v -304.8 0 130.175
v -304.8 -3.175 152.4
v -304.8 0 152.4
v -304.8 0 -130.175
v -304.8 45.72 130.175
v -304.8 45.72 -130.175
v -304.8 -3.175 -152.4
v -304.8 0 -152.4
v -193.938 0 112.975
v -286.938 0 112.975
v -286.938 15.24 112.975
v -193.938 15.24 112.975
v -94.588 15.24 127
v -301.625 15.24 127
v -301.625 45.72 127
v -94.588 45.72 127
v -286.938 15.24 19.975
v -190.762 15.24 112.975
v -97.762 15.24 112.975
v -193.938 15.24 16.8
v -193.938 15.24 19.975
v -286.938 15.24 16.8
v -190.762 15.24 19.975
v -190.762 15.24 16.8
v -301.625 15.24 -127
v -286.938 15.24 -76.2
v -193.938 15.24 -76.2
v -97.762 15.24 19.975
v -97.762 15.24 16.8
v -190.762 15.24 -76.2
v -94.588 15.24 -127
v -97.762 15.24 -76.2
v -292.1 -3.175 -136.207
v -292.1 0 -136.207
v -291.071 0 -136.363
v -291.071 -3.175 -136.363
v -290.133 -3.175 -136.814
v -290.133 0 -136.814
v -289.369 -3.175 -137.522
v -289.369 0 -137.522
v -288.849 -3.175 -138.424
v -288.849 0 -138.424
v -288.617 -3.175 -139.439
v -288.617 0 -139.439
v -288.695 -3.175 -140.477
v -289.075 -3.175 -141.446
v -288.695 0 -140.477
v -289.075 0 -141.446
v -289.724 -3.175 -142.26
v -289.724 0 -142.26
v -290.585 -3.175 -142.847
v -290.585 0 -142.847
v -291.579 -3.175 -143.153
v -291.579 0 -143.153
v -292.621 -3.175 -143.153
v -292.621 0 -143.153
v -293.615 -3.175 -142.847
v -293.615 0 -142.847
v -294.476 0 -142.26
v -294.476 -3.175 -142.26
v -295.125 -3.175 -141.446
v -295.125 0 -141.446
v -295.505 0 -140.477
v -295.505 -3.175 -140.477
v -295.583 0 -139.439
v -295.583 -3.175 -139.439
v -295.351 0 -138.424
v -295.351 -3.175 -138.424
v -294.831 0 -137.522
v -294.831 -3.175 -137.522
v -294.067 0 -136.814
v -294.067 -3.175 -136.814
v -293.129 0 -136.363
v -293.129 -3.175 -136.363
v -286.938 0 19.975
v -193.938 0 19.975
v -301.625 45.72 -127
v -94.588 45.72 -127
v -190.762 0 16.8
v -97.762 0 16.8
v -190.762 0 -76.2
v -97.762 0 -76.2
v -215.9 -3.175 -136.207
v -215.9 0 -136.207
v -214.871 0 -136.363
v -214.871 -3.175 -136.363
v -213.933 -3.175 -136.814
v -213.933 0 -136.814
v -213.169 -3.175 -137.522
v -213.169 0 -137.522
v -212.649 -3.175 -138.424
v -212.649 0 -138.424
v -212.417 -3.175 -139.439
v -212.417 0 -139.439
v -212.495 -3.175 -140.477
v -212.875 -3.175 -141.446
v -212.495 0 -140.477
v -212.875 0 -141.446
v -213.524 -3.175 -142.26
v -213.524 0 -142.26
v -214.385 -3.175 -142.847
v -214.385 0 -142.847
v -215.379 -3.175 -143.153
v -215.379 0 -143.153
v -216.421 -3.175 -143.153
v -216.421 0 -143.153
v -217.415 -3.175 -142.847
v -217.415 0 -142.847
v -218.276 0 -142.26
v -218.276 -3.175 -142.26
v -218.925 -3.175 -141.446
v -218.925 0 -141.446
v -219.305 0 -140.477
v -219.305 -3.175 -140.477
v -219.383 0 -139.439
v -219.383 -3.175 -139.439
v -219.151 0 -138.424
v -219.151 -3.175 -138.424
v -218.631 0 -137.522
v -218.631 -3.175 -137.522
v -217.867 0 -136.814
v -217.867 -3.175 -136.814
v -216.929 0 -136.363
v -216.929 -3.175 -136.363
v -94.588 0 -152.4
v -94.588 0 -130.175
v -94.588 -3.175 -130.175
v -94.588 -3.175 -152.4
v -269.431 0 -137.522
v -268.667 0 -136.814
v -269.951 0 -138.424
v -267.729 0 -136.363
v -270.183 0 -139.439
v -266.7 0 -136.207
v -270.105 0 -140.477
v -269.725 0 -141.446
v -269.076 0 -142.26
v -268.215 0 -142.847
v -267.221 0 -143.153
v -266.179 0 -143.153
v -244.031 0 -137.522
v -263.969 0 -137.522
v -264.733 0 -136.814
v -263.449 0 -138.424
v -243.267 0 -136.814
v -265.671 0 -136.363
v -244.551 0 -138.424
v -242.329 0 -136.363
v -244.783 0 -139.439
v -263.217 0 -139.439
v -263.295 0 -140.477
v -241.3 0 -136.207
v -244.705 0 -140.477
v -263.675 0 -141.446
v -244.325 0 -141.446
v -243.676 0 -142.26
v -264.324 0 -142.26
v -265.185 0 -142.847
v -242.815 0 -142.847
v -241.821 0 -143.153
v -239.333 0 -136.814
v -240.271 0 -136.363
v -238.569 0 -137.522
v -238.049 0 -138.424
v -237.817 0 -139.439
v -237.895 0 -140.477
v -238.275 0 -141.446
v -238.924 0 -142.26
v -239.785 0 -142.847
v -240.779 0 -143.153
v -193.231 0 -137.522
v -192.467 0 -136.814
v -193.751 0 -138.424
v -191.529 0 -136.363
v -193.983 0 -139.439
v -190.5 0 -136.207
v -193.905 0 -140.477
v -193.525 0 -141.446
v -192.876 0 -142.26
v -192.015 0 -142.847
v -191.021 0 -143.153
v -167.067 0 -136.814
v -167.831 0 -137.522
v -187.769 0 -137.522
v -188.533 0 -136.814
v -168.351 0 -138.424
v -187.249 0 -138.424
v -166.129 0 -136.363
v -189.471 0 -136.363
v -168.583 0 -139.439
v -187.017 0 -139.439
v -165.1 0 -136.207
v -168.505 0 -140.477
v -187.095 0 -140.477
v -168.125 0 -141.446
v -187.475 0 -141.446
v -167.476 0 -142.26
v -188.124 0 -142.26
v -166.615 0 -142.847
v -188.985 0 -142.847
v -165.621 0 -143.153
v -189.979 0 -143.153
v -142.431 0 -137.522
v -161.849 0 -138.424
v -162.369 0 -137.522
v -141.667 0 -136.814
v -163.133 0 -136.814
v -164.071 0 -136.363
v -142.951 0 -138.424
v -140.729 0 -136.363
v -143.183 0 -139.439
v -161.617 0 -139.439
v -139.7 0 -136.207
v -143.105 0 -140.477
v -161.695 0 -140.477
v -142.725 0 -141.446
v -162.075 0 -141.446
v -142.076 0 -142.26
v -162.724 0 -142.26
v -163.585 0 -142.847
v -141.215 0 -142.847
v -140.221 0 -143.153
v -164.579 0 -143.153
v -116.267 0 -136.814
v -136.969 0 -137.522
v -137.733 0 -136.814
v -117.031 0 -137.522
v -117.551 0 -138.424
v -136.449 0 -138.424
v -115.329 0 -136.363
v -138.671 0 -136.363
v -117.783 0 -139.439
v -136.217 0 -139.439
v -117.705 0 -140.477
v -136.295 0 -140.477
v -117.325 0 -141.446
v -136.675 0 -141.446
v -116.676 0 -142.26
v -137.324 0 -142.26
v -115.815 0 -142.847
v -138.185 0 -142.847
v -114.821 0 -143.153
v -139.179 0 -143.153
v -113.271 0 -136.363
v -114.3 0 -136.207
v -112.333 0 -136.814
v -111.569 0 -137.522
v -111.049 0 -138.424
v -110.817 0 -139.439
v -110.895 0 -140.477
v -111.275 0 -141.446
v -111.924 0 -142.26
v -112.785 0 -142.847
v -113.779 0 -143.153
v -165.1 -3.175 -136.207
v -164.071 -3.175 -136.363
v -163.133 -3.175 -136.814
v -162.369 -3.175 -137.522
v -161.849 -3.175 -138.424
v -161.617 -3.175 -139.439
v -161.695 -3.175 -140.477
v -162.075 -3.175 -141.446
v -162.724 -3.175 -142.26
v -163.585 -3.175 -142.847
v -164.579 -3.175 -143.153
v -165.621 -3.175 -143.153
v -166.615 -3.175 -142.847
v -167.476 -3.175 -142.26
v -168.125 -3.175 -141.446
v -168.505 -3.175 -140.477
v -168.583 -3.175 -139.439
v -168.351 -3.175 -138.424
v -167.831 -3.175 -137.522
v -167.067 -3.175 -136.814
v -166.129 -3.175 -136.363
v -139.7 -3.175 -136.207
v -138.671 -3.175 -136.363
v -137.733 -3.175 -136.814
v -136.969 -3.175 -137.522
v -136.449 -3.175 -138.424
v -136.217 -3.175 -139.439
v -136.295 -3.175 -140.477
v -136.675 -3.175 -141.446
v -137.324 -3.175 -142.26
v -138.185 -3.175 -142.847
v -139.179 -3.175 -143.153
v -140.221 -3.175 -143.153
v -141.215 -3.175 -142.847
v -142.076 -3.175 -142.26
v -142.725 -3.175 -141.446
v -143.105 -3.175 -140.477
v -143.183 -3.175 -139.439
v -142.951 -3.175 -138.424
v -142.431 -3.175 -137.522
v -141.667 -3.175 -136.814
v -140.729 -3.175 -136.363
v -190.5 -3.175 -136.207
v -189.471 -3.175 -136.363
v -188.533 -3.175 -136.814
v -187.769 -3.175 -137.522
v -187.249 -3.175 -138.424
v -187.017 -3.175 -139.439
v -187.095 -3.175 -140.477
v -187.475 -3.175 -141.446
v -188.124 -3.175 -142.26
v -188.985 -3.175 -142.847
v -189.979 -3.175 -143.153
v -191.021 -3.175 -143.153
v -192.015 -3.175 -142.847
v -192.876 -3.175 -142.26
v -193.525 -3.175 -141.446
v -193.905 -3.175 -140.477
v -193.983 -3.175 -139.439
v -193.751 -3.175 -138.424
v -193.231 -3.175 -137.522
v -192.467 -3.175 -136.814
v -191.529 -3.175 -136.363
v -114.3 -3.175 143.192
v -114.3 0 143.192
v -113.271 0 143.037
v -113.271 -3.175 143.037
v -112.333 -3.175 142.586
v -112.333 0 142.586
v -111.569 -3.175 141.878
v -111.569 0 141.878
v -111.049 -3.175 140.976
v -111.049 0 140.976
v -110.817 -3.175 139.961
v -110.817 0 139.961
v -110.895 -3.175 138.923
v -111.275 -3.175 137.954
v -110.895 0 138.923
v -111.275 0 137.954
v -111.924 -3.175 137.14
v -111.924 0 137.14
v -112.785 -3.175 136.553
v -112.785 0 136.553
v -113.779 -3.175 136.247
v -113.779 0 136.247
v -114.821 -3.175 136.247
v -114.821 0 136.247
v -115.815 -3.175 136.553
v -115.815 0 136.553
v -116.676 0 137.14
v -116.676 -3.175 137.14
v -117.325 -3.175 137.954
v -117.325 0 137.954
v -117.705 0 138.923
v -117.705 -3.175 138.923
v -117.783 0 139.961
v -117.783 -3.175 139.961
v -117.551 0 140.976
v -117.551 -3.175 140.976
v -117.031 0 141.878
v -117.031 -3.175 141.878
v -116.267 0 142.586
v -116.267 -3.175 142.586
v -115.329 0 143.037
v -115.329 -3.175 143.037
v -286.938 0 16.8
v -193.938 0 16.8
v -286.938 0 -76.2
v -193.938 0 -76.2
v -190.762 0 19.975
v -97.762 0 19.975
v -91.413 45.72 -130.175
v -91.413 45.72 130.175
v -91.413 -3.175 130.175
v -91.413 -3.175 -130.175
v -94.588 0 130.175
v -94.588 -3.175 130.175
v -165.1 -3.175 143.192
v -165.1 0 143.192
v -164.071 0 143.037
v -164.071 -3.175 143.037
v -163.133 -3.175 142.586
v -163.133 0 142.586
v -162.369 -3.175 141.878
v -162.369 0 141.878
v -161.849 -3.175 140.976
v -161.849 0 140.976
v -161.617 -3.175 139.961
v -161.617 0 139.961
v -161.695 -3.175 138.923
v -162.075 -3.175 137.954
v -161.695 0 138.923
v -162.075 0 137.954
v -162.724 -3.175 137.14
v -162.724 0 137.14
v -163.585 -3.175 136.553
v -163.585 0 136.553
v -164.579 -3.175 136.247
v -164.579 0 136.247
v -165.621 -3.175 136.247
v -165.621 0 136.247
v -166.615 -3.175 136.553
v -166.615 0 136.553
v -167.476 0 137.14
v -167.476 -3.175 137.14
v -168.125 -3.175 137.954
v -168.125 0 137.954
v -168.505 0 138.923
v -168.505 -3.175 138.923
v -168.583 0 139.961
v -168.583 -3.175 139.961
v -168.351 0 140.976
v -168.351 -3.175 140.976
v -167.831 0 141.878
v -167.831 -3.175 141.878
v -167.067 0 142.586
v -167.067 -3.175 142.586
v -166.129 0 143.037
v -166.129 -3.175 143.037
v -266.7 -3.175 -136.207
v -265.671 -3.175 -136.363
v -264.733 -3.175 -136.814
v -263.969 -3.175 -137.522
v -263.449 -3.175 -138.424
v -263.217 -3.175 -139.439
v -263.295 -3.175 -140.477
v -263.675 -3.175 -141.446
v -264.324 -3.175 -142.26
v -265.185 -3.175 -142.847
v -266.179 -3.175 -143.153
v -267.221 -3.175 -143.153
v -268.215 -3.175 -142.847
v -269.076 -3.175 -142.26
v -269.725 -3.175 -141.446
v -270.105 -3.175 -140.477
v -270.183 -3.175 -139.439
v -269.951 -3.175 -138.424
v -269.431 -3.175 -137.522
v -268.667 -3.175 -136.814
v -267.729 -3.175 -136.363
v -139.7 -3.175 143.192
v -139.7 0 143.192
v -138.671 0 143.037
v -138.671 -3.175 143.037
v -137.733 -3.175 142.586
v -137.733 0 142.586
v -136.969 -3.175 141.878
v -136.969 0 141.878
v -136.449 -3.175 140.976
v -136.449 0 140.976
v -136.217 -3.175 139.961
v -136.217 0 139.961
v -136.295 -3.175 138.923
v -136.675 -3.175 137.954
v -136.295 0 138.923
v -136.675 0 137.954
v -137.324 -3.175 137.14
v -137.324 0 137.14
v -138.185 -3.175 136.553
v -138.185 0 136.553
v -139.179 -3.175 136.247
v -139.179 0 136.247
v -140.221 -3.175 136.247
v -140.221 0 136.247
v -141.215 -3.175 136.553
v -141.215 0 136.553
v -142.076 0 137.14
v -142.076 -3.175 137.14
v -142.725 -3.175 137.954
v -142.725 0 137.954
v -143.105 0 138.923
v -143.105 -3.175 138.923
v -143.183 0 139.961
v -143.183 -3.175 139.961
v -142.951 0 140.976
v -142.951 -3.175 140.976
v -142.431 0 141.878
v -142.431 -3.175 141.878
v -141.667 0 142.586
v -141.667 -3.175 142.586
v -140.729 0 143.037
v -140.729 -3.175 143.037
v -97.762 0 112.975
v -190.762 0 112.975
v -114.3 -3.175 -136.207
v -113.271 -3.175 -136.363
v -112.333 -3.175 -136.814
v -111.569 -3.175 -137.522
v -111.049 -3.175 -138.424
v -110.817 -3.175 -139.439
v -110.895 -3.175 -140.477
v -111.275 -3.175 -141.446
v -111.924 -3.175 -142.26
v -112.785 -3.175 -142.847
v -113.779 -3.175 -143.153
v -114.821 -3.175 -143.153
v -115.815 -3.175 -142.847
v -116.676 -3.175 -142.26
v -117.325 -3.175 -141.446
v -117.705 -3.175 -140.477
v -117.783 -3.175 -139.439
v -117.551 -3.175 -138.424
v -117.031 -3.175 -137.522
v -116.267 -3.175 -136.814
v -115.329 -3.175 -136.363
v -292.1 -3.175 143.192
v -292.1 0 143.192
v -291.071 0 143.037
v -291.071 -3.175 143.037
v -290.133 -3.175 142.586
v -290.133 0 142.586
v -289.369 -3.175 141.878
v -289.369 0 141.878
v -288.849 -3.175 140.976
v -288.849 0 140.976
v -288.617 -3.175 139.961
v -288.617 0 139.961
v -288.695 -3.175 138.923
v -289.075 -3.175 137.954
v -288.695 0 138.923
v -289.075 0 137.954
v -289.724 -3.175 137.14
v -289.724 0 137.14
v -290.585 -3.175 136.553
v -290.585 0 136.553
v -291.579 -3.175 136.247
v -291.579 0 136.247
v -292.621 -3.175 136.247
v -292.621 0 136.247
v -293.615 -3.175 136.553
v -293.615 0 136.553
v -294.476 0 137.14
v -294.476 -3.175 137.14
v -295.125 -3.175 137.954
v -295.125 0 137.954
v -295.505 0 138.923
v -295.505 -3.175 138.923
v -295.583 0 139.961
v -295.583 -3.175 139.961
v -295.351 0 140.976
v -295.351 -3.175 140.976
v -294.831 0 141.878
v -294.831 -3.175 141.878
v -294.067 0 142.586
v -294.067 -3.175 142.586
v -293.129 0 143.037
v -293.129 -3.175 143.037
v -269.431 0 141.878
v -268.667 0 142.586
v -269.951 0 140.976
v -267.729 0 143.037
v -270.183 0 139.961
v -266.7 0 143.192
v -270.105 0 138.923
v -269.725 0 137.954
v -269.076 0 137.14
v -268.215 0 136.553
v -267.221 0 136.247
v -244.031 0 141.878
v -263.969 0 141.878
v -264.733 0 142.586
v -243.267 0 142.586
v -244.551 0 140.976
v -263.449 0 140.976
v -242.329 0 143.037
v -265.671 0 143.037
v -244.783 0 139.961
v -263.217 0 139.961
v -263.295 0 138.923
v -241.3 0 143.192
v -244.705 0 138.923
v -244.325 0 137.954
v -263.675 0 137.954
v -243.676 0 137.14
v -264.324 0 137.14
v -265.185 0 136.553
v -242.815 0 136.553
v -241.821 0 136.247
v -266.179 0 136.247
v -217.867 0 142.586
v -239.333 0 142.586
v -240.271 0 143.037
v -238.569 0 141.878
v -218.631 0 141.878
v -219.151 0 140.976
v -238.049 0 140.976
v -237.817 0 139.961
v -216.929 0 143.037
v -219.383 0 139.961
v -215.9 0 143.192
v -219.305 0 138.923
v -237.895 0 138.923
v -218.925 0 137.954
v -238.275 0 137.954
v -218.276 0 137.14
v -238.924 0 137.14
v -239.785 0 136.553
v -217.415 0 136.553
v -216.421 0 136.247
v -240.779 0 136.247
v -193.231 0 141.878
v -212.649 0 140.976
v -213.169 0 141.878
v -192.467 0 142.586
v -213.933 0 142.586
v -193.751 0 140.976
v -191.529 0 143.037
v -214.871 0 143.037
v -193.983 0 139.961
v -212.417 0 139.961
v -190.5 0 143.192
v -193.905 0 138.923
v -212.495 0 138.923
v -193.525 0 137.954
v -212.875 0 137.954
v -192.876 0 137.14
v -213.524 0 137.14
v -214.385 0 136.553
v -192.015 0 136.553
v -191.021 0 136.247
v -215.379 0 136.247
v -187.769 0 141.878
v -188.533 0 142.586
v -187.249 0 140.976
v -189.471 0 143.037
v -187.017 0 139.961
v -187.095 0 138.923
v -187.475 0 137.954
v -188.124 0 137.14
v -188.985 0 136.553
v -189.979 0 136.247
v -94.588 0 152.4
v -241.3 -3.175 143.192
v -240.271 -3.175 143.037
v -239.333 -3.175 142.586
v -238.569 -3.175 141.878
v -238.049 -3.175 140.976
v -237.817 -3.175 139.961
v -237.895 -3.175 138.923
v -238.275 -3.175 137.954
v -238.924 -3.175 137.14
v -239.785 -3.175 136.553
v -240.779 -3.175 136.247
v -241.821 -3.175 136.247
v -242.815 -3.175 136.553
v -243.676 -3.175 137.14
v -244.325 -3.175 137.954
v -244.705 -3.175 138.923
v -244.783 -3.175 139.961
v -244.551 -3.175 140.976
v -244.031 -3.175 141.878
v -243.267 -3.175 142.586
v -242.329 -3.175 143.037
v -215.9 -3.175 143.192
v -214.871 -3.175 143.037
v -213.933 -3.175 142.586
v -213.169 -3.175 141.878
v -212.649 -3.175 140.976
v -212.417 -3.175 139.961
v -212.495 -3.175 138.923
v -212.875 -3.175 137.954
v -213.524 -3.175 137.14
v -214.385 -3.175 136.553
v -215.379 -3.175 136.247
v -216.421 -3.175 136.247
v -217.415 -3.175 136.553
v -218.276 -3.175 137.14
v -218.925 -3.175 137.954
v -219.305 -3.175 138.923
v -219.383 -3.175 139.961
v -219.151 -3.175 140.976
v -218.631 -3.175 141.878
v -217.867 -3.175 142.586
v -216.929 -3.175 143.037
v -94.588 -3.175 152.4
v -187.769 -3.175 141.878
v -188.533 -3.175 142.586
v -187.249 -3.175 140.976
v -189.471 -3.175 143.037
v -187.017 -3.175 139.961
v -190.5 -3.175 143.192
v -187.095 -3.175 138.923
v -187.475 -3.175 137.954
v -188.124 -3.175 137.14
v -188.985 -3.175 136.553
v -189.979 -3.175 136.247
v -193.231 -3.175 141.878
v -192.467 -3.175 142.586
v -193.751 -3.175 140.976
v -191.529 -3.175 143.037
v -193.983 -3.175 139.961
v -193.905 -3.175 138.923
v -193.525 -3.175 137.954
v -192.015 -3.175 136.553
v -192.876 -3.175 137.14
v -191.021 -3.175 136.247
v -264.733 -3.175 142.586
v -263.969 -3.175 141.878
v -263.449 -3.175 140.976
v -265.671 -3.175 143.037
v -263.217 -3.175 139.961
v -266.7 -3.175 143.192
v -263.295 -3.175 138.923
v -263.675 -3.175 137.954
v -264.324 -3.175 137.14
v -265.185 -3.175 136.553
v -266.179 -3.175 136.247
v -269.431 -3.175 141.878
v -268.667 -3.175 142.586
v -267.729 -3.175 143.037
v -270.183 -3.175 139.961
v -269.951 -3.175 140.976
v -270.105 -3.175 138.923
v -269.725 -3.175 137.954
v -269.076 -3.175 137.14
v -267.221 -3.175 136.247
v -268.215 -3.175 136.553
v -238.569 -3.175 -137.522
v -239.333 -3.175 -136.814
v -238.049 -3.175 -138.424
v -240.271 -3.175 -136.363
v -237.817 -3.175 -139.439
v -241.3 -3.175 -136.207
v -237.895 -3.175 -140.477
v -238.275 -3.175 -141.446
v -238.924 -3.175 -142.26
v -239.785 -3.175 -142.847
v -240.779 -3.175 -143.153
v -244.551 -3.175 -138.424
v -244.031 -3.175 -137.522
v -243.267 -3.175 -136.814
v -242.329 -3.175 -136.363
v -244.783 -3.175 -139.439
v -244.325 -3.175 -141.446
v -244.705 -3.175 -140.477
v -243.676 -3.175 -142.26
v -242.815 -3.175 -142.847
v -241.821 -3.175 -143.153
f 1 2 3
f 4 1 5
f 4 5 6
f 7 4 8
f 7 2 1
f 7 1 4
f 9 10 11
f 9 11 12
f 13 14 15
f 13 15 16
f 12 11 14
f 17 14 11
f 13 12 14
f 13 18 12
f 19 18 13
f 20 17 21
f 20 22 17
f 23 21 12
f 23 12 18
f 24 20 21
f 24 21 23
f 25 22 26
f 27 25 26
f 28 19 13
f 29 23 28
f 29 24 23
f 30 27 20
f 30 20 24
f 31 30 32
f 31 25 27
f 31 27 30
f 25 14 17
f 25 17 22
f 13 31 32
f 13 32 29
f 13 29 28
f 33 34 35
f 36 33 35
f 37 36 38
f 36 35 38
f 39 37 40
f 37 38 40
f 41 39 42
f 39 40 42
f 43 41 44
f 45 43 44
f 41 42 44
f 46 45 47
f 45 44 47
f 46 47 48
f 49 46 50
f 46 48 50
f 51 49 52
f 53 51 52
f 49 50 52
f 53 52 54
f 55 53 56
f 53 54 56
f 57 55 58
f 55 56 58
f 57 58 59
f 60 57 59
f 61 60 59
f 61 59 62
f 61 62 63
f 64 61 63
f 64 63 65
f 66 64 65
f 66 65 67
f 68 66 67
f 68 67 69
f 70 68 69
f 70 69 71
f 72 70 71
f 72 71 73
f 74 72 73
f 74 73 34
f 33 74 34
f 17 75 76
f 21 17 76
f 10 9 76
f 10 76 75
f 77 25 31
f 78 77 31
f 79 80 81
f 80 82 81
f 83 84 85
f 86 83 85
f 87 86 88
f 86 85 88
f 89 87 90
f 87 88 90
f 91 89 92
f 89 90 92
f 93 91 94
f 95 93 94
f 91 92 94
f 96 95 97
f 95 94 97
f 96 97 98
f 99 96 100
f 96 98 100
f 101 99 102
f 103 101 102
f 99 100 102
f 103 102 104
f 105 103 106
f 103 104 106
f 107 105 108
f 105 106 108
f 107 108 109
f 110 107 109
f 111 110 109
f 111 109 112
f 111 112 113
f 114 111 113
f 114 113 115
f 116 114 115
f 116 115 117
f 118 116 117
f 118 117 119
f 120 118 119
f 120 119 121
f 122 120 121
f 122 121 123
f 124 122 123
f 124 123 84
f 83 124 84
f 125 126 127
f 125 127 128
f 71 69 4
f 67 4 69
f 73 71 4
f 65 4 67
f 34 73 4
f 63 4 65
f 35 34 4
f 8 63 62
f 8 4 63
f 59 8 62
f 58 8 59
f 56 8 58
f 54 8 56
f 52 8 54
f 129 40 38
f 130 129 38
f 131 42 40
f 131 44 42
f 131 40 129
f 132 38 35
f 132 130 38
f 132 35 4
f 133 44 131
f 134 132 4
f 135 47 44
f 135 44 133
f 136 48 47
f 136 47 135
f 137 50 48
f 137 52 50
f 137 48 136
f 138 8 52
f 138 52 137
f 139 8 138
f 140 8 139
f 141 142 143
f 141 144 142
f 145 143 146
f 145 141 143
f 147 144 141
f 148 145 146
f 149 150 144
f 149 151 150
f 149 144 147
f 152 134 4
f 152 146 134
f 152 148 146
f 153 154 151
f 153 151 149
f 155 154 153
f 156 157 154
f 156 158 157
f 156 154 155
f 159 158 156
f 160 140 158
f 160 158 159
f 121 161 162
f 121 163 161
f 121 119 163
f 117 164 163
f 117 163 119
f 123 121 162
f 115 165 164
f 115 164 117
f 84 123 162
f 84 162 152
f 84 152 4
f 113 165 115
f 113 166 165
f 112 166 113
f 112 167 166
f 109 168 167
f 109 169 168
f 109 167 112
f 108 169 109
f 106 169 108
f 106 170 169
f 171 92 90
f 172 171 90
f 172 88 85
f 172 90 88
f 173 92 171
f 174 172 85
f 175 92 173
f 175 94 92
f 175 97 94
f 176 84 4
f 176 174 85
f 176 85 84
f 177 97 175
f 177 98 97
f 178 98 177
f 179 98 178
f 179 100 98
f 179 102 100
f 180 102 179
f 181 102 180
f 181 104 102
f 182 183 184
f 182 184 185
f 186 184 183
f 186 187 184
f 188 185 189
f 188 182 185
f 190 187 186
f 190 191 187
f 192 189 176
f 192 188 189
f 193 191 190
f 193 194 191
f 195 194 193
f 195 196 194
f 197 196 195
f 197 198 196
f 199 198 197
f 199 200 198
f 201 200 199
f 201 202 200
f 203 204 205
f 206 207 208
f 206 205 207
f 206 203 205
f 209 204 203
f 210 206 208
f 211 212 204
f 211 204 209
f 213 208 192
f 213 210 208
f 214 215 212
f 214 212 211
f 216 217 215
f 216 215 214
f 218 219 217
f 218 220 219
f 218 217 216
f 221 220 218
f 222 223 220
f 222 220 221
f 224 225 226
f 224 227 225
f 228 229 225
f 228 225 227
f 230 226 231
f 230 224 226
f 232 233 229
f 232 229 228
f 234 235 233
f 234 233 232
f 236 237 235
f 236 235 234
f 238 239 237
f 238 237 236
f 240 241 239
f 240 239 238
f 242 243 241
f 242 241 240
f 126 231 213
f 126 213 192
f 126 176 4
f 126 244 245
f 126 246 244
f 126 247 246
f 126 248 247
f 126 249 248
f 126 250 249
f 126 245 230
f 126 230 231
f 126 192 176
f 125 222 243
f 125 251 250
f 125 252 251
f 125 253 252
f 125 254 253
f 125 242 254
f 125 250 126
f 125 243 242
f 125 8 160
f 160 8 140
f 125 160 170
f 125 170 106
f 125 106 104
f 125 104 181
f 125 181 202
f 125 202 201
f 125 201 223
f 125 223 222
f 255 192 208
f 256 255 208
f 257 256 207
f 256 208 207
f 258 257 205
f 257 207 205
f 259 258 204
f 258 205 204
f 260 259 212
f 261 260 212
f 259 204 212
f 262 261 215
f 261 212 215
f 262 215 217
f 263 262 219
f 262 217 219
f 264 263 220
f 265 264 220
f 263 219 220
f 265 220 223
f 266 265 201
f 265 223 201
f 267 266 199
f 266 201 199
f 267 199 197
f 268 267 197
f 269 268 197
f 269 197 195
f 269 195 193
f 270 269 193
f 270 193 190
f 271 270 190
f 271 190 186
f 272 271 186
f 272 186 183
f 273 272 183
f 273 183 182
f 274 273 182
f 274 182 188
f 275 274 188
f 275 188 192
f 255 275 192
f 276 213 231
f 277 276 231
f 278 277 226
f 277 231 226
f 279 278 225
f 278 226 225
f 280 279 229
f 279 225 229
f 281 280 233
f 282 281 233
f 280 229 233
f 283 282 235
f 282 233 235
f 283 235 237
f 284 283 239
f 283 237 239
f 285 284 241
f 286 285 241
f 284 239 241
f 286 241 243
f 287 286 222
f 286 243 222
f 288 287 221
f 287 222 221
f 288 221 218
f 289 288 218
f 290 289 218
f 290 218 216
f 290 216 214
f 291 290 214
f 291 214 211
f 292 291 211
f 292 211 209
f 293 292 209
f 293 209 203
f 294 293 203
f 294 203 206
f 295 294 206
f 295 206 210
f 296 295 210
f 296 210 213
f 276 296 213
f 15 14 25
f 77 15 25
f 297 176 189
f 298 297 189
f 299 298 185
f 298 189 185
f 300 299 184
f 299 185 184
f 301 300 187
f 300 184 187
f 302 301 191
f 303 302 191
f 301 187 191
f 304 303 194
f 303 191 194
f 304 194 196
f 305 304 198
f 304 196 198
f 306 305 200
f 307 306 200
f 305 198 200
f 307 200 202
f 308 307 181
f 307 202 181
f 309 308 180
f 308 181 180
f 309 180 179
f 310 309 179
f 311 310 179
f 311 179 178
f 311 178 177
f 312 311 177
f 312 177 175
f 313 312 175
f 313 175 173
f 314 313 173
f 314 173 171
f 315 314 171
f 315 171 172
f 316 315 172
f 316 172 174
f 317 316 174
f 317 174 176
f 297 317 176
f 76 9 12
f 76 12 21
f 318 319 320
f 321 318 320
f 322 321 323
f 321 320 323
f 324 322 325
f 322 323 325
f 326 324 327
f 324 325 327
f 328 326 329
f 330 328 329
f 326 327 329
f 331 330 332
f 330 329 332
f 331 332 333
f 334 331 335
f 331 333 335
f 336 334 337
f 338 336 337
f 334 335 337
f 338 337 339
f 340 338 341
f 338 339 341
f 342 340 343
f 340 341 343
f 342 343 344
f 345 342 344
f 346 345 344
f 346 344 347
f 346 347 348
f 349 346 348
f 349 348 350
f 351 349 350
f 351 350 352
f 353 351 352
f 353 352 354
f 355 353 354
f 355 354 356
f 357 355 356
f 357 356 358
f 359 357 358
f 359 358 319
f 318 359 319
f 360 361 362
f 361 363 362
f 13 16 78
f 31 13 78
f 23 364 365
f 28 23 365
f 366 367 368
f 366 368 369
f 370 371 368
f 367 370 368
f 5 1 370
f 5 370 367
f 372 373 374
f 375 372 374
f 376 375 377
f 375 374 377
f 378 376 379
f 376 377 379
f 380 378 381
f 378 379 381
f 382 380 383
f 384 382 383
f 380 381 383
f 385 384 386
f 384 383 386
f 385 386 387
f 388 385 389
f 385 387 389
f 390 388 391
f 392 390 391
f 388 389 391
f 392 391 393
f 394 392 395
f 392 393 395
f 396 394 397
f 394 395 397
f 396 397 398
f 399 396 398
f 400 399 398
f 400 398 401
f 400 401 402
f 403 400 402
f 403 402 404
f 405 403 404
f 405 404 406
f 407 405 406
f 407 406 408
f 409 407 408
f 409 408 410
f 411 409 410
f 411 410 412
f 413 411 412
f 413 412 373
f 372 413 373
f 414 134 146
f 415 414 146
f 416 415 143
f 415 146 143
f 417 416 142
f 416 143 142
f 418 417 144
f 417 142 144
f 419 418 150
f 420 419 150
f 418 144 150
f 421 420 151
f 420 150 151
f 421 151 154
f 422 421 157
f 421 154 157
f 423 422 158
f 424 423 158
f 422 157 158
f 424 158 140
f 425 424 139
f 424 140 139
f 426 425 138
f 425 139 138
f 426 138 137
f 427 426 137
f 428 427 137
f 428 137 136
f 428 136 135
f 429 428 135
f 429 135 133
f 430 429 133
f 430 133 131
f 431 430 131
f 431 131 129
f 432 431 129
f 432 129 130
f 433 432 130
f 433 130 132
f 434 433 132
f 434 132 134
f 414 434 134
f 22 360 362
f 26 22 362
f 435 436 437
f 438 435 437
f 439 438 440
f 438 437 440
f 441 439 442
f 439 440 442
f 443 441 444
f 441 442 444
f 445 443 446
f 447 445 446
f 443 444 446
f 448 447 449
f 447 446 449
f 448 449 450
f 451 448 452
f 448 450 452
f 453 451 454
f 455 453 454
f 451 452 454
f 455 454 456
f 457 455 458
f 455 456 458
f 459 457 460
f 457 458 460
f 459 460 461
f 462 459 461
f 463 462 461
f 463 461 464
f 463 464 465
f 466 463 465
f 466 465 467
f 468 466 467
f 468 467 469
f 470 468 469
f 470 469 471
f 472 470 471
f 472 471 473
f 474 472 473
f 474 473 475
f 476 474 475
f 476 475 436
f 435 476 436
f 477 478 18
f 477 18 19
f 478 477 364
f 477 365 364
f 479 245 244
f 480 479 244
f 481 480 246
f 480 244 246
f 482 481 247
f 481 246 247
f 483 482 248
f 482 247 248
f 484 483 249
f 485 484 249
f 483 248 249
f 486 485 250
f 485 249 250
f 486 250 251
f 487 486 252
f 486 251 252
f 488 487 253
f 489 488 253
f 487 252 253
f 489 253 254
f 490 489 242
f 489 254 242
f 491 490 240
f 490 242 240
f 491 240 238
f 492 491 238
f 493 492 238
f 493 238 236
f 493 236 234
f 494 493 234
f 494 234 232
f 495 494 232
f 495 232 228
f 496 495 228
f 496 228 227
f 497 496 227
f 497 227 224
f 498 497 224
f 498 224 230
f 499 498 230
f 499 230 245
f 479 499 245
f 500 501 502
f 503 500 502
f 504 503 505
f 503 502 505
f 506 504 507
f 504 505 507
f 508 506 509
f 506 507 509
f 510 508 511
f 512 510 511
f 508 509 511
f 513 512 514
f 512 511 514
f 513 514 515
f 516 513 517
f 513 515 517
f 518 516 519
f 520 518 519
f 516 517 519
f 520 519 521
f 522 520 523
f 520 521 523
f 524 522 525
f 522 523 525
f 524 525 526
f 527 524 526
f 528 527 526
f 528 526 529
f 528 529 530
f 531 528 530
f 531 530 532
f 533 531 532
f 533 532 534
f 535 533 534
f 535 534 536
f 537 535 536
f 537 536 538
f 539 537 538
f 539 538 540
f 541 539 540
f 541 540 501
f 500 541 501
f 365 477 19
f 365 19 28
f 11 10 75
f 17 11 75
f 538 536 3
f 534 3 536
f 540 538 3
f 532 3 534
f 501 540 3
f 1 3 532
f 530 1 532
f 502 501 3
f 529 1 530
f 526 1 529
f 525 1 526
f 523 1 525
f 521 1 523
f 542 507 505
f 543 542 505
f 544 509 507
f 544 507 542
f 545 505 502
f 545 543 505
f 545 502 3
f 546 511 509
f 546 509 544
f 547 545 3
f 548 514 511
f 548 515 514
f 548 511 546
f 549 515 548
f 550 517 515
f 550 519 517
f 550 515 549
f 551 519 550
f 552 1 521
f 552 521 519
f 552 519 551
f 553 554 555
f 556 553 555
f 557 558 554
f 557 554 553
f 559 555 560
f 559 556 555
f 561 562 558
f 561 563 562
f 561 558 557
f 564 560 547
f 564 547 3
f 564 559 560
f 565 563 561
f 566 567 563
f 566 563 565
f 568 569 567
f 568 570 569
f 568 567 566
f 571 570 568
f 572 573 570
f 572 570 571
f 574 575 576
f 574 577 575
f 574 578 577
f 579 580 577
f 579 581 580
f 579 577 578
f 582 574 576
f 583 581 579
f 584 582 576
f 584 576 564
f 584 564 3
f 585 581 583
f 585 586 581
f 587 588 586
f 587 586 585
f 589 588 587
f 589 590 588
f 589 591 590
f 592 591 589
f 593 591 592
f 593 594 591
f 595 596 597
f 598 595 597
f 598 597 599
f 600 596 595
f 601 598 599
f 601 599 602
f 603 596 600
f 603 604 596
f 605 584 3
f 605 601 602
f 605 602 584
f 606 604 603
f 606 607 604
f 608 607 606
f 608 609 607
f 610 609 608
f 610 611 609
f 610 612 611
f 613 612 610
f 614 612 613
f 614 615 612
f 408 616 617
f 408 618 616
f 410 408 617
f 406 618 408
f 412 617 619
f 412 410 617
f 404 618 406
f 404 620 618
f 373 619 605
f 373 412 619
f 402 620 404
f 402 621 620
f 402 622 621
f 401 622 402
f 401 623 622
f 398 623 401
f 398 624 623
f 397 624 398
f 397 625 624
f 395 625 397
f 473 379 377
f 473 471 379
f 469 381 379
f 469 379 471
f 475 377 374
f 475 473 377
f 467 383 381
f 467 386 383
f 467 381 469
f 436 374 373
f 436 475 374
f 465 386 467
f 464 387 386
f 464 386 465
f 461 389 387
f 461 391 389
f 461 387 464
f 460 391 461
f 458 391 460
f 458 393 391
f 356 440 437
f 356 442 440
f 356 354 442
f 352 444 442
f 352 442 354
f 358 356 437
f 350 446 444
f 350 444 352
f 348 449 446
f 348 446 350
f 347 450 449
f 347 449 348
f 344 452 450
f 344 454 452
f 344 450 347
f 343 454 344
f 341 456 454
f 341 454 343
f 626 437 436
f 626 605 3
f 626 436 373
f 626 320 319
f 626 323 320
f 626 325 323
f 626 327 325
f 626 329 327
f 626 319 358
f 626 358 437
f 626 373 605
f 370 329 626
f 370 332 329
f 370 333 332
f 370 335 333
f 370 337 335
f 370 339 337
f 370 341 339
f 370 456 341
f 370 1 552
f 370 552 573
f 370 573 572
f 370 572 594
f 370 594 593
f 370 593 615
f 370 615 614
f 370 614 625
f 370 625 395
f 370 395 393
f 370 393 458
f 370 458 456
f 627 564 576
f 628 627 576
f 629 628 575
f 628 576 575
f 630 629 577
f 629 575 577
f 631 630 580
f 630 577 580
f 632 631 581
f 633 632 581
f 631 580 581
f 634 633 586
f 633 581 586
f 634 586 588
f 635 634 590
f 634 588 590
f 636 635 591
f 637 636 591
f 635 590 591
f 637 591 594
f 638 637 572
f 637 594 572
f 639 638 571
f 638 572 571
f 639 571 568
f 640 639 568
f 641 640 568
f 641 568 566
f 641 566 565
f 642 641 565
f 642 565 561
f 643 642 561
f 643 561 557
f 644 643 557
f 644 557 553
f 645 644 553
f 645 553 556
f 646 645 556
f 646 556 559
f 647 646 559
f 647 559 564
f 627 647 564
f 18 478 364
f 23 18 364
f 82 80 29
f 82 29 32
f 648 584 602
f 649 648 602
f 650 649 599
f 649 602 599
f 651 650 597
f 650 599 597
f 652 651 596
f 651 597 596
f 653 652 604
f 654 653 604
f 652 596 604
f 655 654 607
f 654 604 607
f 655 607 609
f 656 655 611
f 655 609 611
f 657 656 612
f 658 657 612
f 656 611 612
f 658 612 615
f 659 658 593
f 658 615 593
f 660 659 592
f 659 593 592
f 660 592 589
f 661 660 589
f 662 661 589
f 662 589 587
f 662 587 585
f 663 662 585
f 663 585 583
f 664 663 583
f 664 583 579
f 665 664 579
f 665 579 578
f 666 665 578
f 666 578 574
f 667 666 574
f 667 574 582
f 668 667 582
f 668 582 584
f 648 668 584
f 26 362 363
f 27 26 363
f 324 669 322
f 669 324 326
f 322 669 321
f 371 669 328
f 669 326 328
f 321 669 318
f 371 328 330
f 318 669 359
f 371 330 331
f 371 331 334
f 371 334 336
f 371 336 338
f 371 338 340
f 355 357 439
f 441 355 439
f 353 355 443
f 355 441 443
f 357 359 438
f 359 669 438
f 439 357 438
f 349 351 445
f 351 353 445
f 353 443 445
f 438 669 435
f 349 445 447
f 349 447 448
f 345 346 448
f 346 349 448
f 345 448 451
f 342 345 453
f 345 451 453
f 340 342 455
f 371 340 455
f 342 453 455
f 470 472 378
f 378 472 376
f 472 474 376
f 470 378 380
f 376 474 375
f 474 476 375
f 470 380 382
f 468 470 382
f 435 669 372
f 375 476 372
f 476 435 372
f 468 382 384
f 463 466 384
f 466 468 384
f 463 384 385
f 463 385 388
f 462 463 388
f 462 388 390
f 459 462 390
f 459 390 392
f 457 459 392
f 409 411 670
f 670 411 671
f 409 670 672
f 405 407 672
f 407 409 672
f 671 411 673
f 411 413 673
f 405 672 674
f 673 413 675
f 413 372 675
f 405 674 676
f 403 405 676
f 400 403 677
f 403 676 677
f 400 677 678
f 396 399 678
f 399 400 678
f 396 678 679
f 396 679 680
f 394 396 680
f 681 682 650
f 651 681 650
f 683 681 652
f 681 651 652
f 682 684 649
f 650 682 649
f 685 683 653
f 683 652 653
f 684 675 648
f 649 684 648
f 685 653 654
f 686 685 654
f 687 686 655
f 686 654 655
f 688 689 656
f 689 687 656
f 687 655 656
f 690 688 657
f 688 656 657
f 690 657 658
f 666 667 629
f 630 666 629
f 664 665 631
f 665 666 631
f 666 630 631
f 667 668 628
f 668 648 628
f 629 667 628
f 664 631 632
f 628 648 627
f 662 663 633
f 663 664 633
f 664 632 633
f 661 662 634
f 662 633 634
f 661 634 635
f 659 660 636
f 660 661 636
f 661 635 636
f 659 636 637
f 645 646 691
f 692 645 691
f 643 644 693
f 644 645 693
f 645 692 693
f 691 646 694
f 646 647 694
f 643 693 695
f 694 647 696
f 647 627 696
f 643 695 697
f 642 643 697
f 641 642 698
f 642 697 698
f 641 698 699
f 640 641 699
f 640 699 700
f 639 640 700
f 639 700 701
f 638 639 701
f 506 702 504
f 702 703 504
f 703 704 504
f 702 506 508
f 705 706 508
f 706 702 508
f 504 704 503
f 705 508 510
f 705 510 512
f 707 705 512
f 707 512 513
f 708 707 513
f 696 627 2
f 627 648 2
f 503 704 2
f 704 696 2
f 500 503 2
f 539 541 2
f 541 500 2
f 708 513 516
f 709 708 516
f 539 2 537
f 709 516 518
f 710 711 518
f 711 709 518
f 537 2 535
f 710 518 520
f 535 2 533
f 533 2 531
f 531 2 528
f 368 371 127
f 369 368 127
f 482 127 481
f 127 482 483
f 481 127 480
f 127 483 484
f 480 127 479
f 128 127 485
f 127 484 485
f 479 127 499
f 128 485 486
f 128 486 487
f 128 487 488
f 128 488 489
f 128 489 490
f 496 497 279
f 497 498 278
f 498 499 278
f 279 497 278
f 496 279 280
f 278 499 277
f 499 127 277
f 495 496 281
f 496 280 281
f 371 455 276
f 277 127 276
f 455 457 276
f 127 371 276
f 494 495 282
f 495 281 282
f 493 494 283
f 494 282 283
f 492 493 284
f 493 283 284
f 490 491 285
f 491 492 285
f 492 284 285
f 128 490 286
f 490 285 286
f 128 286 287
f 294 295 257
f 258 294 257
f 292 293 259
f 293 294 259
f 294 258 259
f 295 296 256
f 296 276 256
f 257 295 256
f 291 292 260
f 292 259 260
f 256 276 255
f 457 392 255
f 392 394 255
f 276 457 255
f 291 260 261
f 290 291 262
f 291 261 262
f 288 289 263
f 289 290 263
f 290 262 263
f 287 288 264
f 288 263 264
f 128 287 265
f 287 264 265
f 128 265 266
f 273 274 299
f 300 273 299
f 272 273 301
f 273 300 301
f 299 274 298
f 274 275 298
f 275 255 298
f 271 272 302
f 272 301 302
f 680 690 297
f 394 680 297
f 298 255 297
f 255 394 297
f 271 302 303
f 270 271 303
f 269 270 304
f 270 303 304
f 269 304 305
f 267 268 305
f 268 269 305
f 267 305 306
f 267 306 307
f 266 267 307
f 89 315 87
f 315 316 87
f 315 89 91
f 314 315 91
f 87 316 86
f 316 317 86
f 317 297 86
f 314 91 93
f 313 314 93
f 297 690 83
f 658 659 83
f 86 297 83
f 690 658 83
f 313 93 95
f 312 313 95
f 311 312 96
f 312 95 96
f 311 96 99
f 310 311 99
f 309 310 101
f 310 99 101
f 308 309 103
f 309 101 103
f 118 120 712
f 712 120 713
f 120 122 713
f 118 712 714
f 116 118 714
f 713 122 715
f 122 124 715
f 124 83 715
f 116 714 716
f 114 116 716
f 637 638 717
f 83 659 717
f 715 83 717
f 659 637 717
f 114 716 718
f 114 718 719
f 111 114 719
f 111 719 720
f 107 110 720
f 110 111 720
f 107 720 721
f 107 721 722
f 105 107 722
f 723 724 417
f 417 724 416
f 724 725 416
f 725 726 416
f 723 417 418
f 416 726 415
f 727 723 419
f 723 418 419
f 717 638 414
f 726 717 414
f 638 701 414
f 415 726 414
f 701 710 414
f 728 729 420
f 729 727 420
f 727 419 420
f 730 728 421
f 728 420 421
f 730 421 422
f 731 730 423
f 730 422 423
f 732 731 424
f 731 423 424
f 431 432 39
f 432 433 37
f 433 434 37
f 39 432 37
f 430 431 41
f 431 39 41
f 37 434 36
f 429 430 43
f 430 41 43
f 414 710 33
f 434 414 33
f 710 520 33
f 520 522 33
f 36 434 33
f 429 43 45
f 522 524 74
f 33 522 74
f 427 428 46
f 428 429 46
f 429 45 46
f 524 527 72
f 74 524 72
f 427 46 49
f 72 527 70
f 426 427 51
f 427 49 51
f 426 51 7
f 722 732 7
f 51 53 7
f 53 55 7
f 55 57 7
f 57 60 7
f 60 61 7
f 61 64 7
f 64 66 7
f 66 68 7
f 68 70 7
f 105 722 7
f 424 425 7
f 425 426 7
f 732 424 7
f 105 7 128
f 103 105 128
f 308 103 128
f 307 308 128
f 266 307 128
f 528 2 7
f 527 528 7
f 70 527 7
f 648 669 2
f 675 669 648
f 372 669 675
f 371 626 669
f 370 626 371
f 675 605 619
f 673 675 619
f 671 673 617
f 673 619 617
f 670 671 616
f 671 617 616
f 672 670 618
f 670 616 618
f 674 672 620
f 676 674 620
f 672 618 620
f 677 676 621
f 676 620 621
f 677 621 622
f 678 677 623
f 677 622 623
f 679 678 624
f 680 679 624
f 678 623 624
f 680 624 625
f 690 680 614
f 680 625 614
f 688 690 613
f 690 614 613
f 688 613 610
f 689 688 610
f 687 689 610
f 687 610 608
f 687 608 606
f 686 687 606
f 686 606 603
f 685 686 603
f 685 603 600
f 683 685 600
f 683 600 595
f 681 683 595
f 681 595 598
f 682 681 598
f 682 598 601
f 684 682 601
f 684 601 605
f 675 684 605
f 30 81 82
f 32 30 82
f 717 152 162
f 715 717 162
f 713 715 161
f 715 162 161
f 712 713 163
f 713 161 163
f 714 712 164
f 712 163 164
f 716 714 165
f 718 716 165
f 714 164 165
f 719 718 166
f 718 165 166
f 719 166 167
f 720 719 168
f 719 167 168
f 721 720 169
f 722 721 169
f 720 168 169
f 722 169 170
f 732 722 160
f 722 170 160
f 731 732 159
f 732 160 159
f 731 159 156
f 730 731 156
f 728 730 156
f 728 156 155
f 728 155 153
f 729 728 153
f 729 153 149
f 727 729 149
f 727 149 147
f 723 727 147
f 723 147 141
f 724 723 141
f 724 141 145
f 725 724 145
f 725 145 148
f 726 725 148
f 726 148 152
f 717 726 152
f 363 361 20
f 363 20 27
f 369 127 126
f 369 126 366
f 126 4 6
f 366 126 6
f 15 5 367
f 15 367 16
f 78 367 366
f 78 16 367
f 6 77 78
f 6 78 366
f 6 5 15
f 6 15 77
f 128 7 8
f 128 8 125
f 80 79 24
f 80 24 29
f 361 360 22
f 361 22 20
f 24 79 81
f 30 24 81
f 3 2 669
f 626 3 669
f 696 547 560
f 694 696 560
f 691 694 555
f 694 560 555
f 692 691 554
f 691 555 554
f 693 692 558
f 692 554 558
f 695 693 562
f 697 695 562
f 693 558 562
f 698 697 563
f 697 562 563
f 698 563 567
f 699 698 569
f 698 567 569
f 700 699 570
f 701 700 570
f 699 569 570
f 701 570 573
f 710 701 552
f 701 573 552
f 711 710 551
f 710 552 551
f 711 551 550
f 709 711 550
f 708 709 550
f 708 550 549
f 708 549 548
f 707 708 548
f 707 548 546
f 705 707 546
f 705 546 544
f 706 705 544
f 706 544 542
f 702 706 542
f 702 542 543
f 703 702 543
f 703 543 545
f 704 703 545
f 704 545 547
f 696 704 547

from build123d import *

# Parameters (mm, degrees)
SKETCH1_W           = 609.6
SKETCH1_H           = 304.8
SKETCH1_W_2         = 93
SKETCH1_H_2         = 93
BOSS_EXTRUDE1_DEPTH = 15.24
SKETCH2_W           = 609.6
SKETCH2_H           = 304.8
BOSS_EXTRUDE2_DEPTH = 3.175
SKETCH3_W           = 609.6
SKETCH3_H           = 304.8
SKETCH3_W_2         = 603.25
SKETCH3_H_2         = 254
BOSS_EXTRUDE3_DEPTH = 30.48
SKETCH4_OUTSIDE_W   = 748.262
SKETCH4_OUTSIDE_H   = 443.462
SKETCH4_OUTSIDE_W_2 = 609.6
SKETCH4_OUTSIDE_H_2 = 260.35
CUT_EXTRUDE1_DEPTH  = 45.72
SKETCH5_R           = 3.4925
CUT_EXTRUDE2_DEPTH  = 344.830071983
SKETCH6_W           = 327.140785269
SKETCH6_H           = 256.091806272
TEMPORARY_CUT_DEPTH = 430.914472374
SKETCH7_W           = 260.35
SKETCH7_H           = 48.895
BOSS_EXTRUDE4_DEPTH = 3.175


with BuildPart() as part:
    # Sketch1 → Boss-Extrude1 (new body)
    with BuildSketch(Plane(origin=(0, 0, 0), x_dir=(1, 0, 0), z_dir=(0, 1, 0))):
        Rectangle(SKETCH1_W, SKETCH1_H)
        with Locations((-48.0875, 29.7)):
            Rectangle(SKETCH1_W_2, SKETCH1_H_2, mode=Mode.SUBTRACT)
        with Locations((-144.2625, 29.7)):
            Rectangle(SKETCH1_W_2, SKETCH1_H_2, mode=Mode.SUBTRACT)
        with Locations((-144.2625, -66.475)):
            Rectangle(SKETCH1_W_2, SKETCH1_H_2, mode=Mode.SUBTRACT)
        with Locations((-48.0875, -66.475)):
            Rectangle(SKETCH1_W_2, SKETCH1_H_2, mode=Mode.SUBTRACT)
        with Locations((-240.4375, 29.7)):
            Rectangle(SKETCH1_W_2, SKETCH1_H_2, mode=Mode.SUBTRACT)
        with Locations((-240.4375, -66.475)):
            Rectangle(SKETCH1_W_2, SKETCH1_H_2, mode=Mode.SUBTRACT)
        with Locations((48.0875, 29.7)):
            Rectangle(SKETCH1_W_2, SKETCH1_H_2, mode=Mode.SUBTRACT)
        with Locations((48.0875, -66.475)):
            Rectangle(SKETCH1_W_2, SKETCH1_H_2, mode=Mode.SUBTRACT)
        with Locations((144.2625, 29.7)):
            Rectangle(SKETCH1_W_2, SKETCH1_H_2, mode=Mode.SUBTRACT)
        with Locations((144.2625, -66.475)):
            Rectangle(SKETCH1_W_2, SKETCH1_H_2, mode=Mode.SUBTRACT)
        with Locations((240.4375, 29.7)):
            Rectangle(SKETCH1_W_2, SKETCH1_H_2, mode=Mode.SUBTRACT)
        with Locations((240.4375, -66.475)):
            Rectangle(SKETCH1_W_2, SKETCH1_H_2, mode=Mode.SUBTRACT)
    extrude(amount=BOSS_EXTRUDE1_DEPTH)

    # Sketch2 → Boss-Extrude2 (add)
    with BuildSketch(Plane(origin=(0, 0, 0), x_dir=(-1, 0, 0), z_dir=(0, -1, 0))):
        Rectangle(SKETCH2_W, SKETCH2_H)
    extrude(amount=BOSS_EXTRUDE2_DEPTH)

    # Sketch3 → Boss-Extrude3 (add)
    with BuildSketch(Plane(origin=(0, 15.24, 0), x_dir=(1, 0, 0), z_dir=(0, 1, 0))):
        Rectangle(SKETCH3_W, SKETCH3_H)
        Rectangle(SKETCH3_W_2, SKETCH3_H_2, mode=Mode.SUBTRACT)
    extrude(amount=BOSS_EXTRUDE3_DEPTH)

    # Sketch4 outside → Cut-Extrude1 (cut)
    with BuildSketch(Plane(origin=(0, 45.72, 0), x_dir=(1, 0, 0), z_dir=(0, 1, 0))):
        Rectangle(SKETCH4_OUTSIDE_W, SKETCH4_OUTSIDE_H)
        Rectangle(SKETCH4_OUTSIDE_W_2, SKETCH4_OUTSIDE_H_2, mode=Mode.SUBTRACT)
    extrude(amount=-CUT_EXTRUDE1_DEPTH, mode=Mode.SUBTRACT)

    # Sketch5 → Cut-Extrude2 (cut, through all)
    with BuildSketch(Plane(origin=(0, 0, 0), x_dir=(1, 0, 0), z_dir=(0, 1, 0))):
        with Locations(Location((-292.1, -139.7, 0), (0, 0, 270))):
            Circle(SKETCH5_R)
        with Locations(Location((-266.7, -139.7, 0), (0, 0, 270))):
            Circle(SKETCH5_R)
        with Locations(Location((-241.3, -139.7, 0), (0, 0, 270))):
            Circle(SKETCH5_R)
        with Locations(Location((-215.9, -139.7, 0), (0, 0, 270))):
            Circle(SKETCH5_R)
        with Locations(Location((-190.5, -139.7, 0), (0, 0, 270))):
            Circle(SKETCH5_R)
        with Locations(Location((-165.1, -139.7, 0), (0, 0, 270))):
            Circle(SKETCH5_R)
        with Locations(Location((-139.7, -139.7, 0), (0, 0, 270))):
            Circle(SKETCH5_R)
        with Locations(Location((-114.3, -139.7, 0), (0, 0, 270))):
            Circle(SKETCH5_R)
        with Locations(Location((-88.9, -139.7, 0), (0, 0, 270))):
            Circle(SKETCH5_R)
        with Locations(Location((-63.5, -139.7, 0), (0, 0, 270))):
            Circle(SKETCH5_R)
        with Locations(Location((-38.1, -139.7, 0), (0, 0, 270))):
            Circle(SKETCH5_R)
        with Locations(Location((-12.7, -139.7, 0), (0, 0, 270))):
            Circle(SKETCH5_R)
        with Locations(Location((12.7, 139.7, 0), (0, 0, 270))):
            Circle(SKETCH5_R)
        with Locations(Location((38.1, 139.7, 0), (0, 0, 270))):
            Circle(SKETCH5_R)
        with Locations(Location((63.5, 139.7, 0), (0, 0, 270))):
            Circle(SKETCH5_R)
        with Locations(Location((88.9, 139.7, 0), (0, 0, 270))):
            Circle(SKETCH5_R)
        with Locations(Location((114.3, 139.7, 0), (0, 0, 270))):
            Circle(SKETCH5_R)
        with Locations(Location((139.7, 139.7, 0), (0, 0, 270))):
            Circle(SKETCH5_R)
        with Locations(Location((165.1, 139.7, 0), (0, 0, 270))):
            Circle(SKETCH5_R)
        with Locations(Location((190.5, 139.7, 0), (0, 0, 270))):
            Circle(SKETCH5_R)
        with Locations(Location((215.9, 139.7, 0), (0, 0, 270))):
            Circle(SKETCH5_R)
        with Locations(Location((241.3, 139.7, 0), (0, 0, 270))):
            Circle(SKETCH5_R)
        with Locations(Location((-292.1, 139.7, 0), (0, 0, 270))):
            Circle(SKETCH5_R)
        with Locations(Location((-266.7, 139.7, 0), (0, 0, 270))):
            Circle(SKETCH5_R)
        with Locations(Location((-241.3, 139.7, 0), (0, 0, 270))):
            Circle(SKETCH5_R)
        with Locations(Location((-215.9, 139.7, 0), (0, 0, 270))):
            Circle(SKETCH5_R)
        with Locations(Location((-190.5, 139.7, 0), (0, 0, 270))):
            Circle(SKETCH5_R)
        with Locations(Location((-165.1, 139.7, 0), (0, 0, 270))):
            Circle(SKETCH5_R)
        with Locations(Location((-139.7, 139.7, 0), (0, 0, 270))):
            Circle(SKETCH5_R)
        with Locations(Location((-114.3, 139.7, 0), (0, 0, 270))):
            Circle(SKETCH5_R)
        with Locations(Location((-88.9, 139.7, 0), (0, 0, 270))):
            Circle(SKETCH5_R)
        with Locations(Location((-63.5, 139.7, 0), (0, 0, 270))):
            Circle(SKETCH5_R)
        with Locations(Location((-38.1, 139.7, 0), (0, 0, 270))):
            Circle(SKETCH5_R)
        with Locations(Location((-12.7, 139.7, 0), (0, 0, 270))):
            Circle(SKETCH5_R)
        with Locations(Location((266.7, 139.7, 0), (0, 0, 270))):
            Circle(SKETCH5_R)
        with Locations(Location((292.1, 139.7, 0), (0, 0, 270))):
            Circle(SKETCH5_R)
        with Locations(Location((12.7, -139.7, 0), (0, 0, 270))):
            Circle(SKETCH5_R)
        with Locations(Location((38.1, -139.7, 0), (0, 0, 270))):
            Circle(SKETCH5_R)
        with Locations(Location((63.5, -139.7, 0), (0, 0, 270))):
            Circle(SKETCH5_R)
        with Locations(Location((88.9, -139.7, 0), (0, 0, 270))):
            Circle(SKETCH5_R)
        with Locations(Location((114.3, -139.7, 0), (0, 0, 270))):
            Circle(SKETCH5_R)
        with Locations(Location((139.7, -139.7, 0), (0, 0, 270))):
            Circle(SKETCH5_R)
        with Locations(Location((165.1, -139.7, 0), (0, 0, 270))):
            Circle(SKETCH5_R)
        with Locations(Location((190.5, -139.7, 0), (0, 0, 270))):
            Circle(SKETCH5_R)
        with Locations(Location((215.9, -139.7, 0), (0, 0, 270))):
            Circle(SKETCH5_R)
        with Locations(Location((241.3, -139.7, 0), (0, 0, 270))):
            Circle(SKETCH5_R)
        with Locations(Location((266.7, -139.7, 0), (0, 0, 270))):
            Circle(SKETCH5_R)
        with Locations(Location((292.1, -139.7, 0), (0, 0, 270))):
            Circle(SKETCH5_R)
    extrude(amount=-CUT_EXTRUDE2_DEPTH, mode=Mode.SUBTRACT)

    # Sketch6 → Temporary_Cut (cut, through all)
    with BuildSketch(Plane(origin=(-94.5875, 0, 0), x_dir=(0, 0, -1), z_dir=(1, 0, 0))):
        with Locations((-7.828616148, 44.910513642)):
            Rectangle(SKETCH6_W, SKETCH6_H)
    extrude(amount=TEMPORARY_CUT_DEPTH, mode=Mode.SUBTRACT)

    # Sketch7 → Boss-Extrude4 (add)
    with BuildSketch(Plane(origin=(-94.5875, 0, 0), x_dir=(0, 0, -1), z_dir=(1, 0, 0))):
        with Locations((0, 21.2725)):
            Rectangle(SKETCH7_W, SKETCH7_H)
    extrude(amount=BOSS_EXTRUDE4_DEPTH)


solid = part.part
